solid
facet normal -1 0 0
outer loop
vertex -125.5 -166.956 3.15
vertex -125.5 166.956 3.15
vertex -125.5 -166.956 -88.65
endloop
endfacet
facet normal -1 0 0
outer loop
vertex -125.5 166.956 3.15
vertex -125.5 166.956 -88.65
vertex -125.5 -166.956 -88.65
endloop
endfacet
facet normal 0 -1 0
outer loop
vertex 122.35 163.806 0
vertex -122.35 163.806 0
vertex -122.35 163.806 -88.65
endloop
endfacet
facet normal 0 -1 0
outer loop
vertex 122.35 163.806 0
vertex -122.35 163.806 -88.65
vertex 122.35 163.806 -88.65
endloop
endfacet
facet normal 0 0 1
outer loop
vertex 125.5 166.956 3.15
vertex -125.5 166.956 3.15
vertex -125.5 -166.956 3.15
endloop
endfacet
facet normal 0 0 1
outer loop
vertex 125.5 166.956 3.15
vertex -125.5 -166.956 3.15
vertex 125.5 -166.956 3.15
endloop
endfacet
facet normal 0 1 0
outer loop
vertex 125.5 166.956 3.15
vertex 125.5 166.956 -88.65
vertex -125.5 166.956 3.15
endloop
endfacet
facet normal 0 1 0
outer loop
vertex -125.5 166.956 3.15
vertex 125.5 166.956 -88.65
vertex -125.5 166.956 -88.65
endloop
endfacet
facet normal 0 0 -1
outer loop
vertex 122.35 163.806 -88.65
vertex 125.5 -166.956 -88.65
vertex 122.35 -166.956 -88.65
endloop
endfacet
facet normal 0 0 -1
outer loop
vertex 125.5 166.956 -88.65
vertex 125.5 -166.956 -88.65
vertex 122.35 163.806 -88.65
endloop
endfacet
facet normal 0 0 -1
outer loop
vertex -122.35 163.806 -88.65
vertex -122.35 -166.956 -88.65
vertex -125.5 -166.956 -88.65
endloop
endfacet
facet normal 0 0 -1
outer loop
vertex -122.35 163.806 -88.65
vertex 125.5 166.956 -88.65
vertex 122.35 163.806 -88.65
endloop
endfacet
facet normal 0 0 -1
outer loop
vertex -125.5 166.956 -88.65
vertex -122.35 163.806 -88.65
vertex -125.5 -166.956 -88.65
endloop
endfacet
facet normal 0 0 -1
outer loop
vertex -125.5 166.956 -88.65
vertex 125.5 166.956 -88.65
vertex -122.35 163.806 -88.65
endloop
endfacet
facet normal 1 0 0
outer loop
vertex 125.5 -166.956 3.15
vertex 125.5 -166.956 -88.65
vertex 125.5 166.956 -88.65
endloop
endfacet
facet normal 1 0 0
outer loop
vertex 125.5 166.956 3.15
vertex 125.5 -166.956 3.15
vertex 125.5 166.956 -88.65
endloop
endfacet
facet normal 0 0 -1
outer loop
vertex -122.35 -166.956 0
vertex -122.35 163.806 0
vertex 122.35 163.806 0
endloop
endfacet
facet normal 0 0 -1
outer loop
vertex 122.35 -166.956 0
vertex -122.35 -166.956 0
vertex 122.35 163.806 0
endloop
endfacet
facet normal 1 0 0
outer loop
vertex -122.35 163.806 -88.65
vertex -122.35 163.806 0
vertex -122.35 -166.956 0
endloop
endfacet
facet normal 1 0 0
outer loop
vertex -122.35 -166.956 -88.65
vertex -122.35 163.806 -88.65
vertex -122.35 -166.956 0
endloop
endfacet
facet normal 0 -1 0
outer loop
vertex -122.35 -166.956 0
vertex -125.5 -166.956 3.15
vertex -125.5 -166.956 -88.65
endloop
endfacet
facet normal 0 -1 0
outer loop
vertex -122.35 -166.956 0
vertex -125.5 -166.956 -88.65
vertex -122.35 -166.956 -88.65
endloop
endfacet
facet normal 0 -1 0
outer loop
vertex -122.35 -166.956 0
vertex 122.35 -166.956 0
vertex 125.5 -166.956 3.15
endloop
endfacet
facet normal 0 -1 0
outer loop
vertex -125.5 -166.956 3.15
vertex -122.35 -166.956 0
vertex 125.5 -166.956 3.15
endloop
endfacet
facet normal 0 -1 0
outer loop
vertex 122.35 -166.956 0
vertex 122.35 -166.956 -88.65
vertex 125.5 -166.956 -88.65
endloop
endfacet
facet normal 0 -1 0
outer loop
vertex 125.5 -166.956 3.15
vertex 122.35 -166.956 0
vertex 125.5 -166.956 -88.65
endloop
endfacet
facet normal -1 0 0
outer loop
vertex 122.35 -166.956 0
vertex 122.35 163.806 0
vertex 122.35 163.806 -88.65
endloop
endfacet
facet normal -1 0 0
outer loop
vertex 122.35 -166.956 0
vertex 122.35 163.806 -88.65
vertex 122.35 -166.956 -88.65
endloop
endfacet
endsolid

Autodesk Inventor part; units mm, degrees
ref_plane "YZ Plane" through (0, 0, 0) normal (1, 0, 0) x (0, 1, 0)
ref_plane "XZ Plane" through (0, 0, 0) normal (0, 1, 0) x (-1, 0, 0)
ref_plane "XY Plane" through (0, 0, 0) normal (0, 0, 1) x (1, 0, 0)
sketch "Sketch1" plane through (0, 0, 0) normal (0, 0, 1) x (1, 0, 0)
  line L0 (-125.5, -166.9563) -> (125.5, -166.9563)
  line L1 (125.5, -166.9563) -> (125.5, 166.9563)
  line L2 (125.5, 166.9563) -> (-125.5, 166.9563)
  line L3 (-125.5, 166.9563) -> (-125.5, -166.9563)
  line L4 (-125.5, -166.9563) -> (125.5, 166.9563) construction
  line L5 (125.5, -166.9563) -> (-125.5, 166.9563) construction
  point P0 (0, 0)
  dimension "d0" = 251
  dimension "d1" = 333.9125
extrude "Extrusion1" add sketch "Sketch1" along normal blind 3.15
sketch "Sketch2" plane through (0, 0, 0) normal (0, 0, -1) x (-1, 0, 0)
  line L0 (125.5, -166.9563) -> (-125.5, -166.9563) projected
  line L1 (-125.5, 166.9563) -> (-122.35, 166.9563)
  line L2 (-122.35, 166.9563) -> (-122.35, -166.9563)
  line L3 (-122.35, -166.9563) -> (-125.5, -166.9563)
  line L4 (-125.5, -166.9563) -> (-125.5, 166.9563)
  line L5 (125.5, 166.9563) -> (122.35, 166.9563)
  line L6 (122.35, 166.9563) -> (122.35, -166.9563)
  line L7 (122.35, -166.9563) -> (125.5, -166.9563)
  line L8 (125.5, -166.9563) -> (125.5, 166.9563)
  line L9 (-122.35, 166.9563) -> (122.35, 166.9563)
  line L10 (122.35, 166.9563) -> (122.35, 163.8062)
  line L11 (122.35, 163.8062) -> (-122.35, 163.8062)
  line L12 (-122.35, 163.8062) -> (-122.35, 166.9563)
  point P0 (0, 0)
  dimension "d4" = 3.15
  dimension "d5" = 3.15
  dimension "d6" = 3.15
extrude "Extrusion2" add sketch "Sketch2" along normal blind 88.65 contours L0 L6 L5 L8 | L0 L4 L1 L2 | L11 L2 L9 L6
equation "\"d0\" = door_x"
equation "\"d1\" = door_z"
equation "\"d2\" = clear_acrylic"
equation "\"d4\" = clear_acrylic"
equation "\"d5\" = clear_acrylic"
equation "\"d6\" = clear_acrylic"
equation "\"d7\" = window_y"
equation "\"sm_thickness\" = 1.5875"
equation "\"al_thickness\" = 1.5875"
equation "\"bend_factor\" = 2.26205"
equation "\"al_bend\" = 3.591"
equation "\"sm_bend\" = 3.591"
equation "\"very_thick_acrylic\" = 9.45"
equation "\"thick_acrylic\" = 5.88"
equation "\"thin_acrylic\" = 3.15"
equation "\"clear_acrylic\" = 3.15"
equation "\"wood_thickness\" = 6.72"
equation "\"m3_diameter\" = 3"
equation "\"m3_head\" = 6"
equation "\"m4_diameter\" = 4"
equation "\"m5_diameter\" = 5"
equation "\"m5_head\" = 10.3"
equation "\"rivet_diameter\" = 3.3"
equation "\"brass_insert_drill\" = 4"
equation "\"m5_brass_insert_drill\" = 6.7"
equation "\"m3_press_nut_drill\" = 4.5"
equation "\"m5_press_nut_drill\" = 6.5"
equation "\"laser_body_diameter\" = 12"
equation "\"carrier_y\" = 251"
equation "\"carrier_y2\" = 76.825"
equation "\"carrier_z\" = 12"
equation "\"carrier_z2\" = 25"
equation "\"visor_x\" = 257.3"
equation "\"visor_y\" = 108.65"
equation "\"window_z\" = 333.9125"
equation "\"window_y\" = 88.65"
equation "\"window_overlap\" = 48"
equation "\"acrylic_into_frame\" = 5"
equation "\"door_x\" = 251"
equation "\"door_z\" = 333.9125"
equation "\"door_overlap\" = 48"
equation "\"reservoir_x\" = 201"
equation "\"reservoir_y\" = 201"
equation "\"linear_bearing_spacing\" = 271"
equation "\"tray_border\" = 25"
equation "\"tray_x\" = 251"
equation "\"tray_y\" = 251"
equation "\"bed_z\" = 25"
equation "\"crane_z2\" = 12"
equation "\"switch_spacing\" = 19"
equation "\"frame_top_z\" = 385"
equation "\"frame_bottom_z\" = 275"
equation "\"frame_total_z\" = 661.5875"
equation "\"frame_x\" = 350.2"
equation "\"frame_face_y\" = 45"
equation "\"frame_border\" = 46.35"
equation "\"frame_foot_z\" = 12"
equation "\"frame_screw_from_center\" = 25"
equation "\"laser_y_offset\" = 19.4"
equation "\"laser_diameter\" = 12"
equation "\"laser_z_offset\" = 55"
equation "\"laser_y\" = 15"
equation "\"laser_z\" = 75"
equation "\"laser_gap\" = 1"
equation "\"subframe_x\" = 66"
equation "\"subframe_y\" = 55"
equation "\"galvo_frame_x\" = 66"
equation "\"galvo_frame_z\" = 65"
equation "\"galvo_frame_y_offset\" = 27.5"
equation "\"drawer_x\" = 257.3"
equation "\"drawer_y\" = 85.2375"
equation "\"drawer_z\" = 278.175"
equation "\"drawer_support_from_top\" = 48"
equation "\"drawer_screw_z\" = 145"
equation "\"drawer_screw_from_center\" = 55"
equation "\"nema17_x\" = 43"
properties part number "window2"
